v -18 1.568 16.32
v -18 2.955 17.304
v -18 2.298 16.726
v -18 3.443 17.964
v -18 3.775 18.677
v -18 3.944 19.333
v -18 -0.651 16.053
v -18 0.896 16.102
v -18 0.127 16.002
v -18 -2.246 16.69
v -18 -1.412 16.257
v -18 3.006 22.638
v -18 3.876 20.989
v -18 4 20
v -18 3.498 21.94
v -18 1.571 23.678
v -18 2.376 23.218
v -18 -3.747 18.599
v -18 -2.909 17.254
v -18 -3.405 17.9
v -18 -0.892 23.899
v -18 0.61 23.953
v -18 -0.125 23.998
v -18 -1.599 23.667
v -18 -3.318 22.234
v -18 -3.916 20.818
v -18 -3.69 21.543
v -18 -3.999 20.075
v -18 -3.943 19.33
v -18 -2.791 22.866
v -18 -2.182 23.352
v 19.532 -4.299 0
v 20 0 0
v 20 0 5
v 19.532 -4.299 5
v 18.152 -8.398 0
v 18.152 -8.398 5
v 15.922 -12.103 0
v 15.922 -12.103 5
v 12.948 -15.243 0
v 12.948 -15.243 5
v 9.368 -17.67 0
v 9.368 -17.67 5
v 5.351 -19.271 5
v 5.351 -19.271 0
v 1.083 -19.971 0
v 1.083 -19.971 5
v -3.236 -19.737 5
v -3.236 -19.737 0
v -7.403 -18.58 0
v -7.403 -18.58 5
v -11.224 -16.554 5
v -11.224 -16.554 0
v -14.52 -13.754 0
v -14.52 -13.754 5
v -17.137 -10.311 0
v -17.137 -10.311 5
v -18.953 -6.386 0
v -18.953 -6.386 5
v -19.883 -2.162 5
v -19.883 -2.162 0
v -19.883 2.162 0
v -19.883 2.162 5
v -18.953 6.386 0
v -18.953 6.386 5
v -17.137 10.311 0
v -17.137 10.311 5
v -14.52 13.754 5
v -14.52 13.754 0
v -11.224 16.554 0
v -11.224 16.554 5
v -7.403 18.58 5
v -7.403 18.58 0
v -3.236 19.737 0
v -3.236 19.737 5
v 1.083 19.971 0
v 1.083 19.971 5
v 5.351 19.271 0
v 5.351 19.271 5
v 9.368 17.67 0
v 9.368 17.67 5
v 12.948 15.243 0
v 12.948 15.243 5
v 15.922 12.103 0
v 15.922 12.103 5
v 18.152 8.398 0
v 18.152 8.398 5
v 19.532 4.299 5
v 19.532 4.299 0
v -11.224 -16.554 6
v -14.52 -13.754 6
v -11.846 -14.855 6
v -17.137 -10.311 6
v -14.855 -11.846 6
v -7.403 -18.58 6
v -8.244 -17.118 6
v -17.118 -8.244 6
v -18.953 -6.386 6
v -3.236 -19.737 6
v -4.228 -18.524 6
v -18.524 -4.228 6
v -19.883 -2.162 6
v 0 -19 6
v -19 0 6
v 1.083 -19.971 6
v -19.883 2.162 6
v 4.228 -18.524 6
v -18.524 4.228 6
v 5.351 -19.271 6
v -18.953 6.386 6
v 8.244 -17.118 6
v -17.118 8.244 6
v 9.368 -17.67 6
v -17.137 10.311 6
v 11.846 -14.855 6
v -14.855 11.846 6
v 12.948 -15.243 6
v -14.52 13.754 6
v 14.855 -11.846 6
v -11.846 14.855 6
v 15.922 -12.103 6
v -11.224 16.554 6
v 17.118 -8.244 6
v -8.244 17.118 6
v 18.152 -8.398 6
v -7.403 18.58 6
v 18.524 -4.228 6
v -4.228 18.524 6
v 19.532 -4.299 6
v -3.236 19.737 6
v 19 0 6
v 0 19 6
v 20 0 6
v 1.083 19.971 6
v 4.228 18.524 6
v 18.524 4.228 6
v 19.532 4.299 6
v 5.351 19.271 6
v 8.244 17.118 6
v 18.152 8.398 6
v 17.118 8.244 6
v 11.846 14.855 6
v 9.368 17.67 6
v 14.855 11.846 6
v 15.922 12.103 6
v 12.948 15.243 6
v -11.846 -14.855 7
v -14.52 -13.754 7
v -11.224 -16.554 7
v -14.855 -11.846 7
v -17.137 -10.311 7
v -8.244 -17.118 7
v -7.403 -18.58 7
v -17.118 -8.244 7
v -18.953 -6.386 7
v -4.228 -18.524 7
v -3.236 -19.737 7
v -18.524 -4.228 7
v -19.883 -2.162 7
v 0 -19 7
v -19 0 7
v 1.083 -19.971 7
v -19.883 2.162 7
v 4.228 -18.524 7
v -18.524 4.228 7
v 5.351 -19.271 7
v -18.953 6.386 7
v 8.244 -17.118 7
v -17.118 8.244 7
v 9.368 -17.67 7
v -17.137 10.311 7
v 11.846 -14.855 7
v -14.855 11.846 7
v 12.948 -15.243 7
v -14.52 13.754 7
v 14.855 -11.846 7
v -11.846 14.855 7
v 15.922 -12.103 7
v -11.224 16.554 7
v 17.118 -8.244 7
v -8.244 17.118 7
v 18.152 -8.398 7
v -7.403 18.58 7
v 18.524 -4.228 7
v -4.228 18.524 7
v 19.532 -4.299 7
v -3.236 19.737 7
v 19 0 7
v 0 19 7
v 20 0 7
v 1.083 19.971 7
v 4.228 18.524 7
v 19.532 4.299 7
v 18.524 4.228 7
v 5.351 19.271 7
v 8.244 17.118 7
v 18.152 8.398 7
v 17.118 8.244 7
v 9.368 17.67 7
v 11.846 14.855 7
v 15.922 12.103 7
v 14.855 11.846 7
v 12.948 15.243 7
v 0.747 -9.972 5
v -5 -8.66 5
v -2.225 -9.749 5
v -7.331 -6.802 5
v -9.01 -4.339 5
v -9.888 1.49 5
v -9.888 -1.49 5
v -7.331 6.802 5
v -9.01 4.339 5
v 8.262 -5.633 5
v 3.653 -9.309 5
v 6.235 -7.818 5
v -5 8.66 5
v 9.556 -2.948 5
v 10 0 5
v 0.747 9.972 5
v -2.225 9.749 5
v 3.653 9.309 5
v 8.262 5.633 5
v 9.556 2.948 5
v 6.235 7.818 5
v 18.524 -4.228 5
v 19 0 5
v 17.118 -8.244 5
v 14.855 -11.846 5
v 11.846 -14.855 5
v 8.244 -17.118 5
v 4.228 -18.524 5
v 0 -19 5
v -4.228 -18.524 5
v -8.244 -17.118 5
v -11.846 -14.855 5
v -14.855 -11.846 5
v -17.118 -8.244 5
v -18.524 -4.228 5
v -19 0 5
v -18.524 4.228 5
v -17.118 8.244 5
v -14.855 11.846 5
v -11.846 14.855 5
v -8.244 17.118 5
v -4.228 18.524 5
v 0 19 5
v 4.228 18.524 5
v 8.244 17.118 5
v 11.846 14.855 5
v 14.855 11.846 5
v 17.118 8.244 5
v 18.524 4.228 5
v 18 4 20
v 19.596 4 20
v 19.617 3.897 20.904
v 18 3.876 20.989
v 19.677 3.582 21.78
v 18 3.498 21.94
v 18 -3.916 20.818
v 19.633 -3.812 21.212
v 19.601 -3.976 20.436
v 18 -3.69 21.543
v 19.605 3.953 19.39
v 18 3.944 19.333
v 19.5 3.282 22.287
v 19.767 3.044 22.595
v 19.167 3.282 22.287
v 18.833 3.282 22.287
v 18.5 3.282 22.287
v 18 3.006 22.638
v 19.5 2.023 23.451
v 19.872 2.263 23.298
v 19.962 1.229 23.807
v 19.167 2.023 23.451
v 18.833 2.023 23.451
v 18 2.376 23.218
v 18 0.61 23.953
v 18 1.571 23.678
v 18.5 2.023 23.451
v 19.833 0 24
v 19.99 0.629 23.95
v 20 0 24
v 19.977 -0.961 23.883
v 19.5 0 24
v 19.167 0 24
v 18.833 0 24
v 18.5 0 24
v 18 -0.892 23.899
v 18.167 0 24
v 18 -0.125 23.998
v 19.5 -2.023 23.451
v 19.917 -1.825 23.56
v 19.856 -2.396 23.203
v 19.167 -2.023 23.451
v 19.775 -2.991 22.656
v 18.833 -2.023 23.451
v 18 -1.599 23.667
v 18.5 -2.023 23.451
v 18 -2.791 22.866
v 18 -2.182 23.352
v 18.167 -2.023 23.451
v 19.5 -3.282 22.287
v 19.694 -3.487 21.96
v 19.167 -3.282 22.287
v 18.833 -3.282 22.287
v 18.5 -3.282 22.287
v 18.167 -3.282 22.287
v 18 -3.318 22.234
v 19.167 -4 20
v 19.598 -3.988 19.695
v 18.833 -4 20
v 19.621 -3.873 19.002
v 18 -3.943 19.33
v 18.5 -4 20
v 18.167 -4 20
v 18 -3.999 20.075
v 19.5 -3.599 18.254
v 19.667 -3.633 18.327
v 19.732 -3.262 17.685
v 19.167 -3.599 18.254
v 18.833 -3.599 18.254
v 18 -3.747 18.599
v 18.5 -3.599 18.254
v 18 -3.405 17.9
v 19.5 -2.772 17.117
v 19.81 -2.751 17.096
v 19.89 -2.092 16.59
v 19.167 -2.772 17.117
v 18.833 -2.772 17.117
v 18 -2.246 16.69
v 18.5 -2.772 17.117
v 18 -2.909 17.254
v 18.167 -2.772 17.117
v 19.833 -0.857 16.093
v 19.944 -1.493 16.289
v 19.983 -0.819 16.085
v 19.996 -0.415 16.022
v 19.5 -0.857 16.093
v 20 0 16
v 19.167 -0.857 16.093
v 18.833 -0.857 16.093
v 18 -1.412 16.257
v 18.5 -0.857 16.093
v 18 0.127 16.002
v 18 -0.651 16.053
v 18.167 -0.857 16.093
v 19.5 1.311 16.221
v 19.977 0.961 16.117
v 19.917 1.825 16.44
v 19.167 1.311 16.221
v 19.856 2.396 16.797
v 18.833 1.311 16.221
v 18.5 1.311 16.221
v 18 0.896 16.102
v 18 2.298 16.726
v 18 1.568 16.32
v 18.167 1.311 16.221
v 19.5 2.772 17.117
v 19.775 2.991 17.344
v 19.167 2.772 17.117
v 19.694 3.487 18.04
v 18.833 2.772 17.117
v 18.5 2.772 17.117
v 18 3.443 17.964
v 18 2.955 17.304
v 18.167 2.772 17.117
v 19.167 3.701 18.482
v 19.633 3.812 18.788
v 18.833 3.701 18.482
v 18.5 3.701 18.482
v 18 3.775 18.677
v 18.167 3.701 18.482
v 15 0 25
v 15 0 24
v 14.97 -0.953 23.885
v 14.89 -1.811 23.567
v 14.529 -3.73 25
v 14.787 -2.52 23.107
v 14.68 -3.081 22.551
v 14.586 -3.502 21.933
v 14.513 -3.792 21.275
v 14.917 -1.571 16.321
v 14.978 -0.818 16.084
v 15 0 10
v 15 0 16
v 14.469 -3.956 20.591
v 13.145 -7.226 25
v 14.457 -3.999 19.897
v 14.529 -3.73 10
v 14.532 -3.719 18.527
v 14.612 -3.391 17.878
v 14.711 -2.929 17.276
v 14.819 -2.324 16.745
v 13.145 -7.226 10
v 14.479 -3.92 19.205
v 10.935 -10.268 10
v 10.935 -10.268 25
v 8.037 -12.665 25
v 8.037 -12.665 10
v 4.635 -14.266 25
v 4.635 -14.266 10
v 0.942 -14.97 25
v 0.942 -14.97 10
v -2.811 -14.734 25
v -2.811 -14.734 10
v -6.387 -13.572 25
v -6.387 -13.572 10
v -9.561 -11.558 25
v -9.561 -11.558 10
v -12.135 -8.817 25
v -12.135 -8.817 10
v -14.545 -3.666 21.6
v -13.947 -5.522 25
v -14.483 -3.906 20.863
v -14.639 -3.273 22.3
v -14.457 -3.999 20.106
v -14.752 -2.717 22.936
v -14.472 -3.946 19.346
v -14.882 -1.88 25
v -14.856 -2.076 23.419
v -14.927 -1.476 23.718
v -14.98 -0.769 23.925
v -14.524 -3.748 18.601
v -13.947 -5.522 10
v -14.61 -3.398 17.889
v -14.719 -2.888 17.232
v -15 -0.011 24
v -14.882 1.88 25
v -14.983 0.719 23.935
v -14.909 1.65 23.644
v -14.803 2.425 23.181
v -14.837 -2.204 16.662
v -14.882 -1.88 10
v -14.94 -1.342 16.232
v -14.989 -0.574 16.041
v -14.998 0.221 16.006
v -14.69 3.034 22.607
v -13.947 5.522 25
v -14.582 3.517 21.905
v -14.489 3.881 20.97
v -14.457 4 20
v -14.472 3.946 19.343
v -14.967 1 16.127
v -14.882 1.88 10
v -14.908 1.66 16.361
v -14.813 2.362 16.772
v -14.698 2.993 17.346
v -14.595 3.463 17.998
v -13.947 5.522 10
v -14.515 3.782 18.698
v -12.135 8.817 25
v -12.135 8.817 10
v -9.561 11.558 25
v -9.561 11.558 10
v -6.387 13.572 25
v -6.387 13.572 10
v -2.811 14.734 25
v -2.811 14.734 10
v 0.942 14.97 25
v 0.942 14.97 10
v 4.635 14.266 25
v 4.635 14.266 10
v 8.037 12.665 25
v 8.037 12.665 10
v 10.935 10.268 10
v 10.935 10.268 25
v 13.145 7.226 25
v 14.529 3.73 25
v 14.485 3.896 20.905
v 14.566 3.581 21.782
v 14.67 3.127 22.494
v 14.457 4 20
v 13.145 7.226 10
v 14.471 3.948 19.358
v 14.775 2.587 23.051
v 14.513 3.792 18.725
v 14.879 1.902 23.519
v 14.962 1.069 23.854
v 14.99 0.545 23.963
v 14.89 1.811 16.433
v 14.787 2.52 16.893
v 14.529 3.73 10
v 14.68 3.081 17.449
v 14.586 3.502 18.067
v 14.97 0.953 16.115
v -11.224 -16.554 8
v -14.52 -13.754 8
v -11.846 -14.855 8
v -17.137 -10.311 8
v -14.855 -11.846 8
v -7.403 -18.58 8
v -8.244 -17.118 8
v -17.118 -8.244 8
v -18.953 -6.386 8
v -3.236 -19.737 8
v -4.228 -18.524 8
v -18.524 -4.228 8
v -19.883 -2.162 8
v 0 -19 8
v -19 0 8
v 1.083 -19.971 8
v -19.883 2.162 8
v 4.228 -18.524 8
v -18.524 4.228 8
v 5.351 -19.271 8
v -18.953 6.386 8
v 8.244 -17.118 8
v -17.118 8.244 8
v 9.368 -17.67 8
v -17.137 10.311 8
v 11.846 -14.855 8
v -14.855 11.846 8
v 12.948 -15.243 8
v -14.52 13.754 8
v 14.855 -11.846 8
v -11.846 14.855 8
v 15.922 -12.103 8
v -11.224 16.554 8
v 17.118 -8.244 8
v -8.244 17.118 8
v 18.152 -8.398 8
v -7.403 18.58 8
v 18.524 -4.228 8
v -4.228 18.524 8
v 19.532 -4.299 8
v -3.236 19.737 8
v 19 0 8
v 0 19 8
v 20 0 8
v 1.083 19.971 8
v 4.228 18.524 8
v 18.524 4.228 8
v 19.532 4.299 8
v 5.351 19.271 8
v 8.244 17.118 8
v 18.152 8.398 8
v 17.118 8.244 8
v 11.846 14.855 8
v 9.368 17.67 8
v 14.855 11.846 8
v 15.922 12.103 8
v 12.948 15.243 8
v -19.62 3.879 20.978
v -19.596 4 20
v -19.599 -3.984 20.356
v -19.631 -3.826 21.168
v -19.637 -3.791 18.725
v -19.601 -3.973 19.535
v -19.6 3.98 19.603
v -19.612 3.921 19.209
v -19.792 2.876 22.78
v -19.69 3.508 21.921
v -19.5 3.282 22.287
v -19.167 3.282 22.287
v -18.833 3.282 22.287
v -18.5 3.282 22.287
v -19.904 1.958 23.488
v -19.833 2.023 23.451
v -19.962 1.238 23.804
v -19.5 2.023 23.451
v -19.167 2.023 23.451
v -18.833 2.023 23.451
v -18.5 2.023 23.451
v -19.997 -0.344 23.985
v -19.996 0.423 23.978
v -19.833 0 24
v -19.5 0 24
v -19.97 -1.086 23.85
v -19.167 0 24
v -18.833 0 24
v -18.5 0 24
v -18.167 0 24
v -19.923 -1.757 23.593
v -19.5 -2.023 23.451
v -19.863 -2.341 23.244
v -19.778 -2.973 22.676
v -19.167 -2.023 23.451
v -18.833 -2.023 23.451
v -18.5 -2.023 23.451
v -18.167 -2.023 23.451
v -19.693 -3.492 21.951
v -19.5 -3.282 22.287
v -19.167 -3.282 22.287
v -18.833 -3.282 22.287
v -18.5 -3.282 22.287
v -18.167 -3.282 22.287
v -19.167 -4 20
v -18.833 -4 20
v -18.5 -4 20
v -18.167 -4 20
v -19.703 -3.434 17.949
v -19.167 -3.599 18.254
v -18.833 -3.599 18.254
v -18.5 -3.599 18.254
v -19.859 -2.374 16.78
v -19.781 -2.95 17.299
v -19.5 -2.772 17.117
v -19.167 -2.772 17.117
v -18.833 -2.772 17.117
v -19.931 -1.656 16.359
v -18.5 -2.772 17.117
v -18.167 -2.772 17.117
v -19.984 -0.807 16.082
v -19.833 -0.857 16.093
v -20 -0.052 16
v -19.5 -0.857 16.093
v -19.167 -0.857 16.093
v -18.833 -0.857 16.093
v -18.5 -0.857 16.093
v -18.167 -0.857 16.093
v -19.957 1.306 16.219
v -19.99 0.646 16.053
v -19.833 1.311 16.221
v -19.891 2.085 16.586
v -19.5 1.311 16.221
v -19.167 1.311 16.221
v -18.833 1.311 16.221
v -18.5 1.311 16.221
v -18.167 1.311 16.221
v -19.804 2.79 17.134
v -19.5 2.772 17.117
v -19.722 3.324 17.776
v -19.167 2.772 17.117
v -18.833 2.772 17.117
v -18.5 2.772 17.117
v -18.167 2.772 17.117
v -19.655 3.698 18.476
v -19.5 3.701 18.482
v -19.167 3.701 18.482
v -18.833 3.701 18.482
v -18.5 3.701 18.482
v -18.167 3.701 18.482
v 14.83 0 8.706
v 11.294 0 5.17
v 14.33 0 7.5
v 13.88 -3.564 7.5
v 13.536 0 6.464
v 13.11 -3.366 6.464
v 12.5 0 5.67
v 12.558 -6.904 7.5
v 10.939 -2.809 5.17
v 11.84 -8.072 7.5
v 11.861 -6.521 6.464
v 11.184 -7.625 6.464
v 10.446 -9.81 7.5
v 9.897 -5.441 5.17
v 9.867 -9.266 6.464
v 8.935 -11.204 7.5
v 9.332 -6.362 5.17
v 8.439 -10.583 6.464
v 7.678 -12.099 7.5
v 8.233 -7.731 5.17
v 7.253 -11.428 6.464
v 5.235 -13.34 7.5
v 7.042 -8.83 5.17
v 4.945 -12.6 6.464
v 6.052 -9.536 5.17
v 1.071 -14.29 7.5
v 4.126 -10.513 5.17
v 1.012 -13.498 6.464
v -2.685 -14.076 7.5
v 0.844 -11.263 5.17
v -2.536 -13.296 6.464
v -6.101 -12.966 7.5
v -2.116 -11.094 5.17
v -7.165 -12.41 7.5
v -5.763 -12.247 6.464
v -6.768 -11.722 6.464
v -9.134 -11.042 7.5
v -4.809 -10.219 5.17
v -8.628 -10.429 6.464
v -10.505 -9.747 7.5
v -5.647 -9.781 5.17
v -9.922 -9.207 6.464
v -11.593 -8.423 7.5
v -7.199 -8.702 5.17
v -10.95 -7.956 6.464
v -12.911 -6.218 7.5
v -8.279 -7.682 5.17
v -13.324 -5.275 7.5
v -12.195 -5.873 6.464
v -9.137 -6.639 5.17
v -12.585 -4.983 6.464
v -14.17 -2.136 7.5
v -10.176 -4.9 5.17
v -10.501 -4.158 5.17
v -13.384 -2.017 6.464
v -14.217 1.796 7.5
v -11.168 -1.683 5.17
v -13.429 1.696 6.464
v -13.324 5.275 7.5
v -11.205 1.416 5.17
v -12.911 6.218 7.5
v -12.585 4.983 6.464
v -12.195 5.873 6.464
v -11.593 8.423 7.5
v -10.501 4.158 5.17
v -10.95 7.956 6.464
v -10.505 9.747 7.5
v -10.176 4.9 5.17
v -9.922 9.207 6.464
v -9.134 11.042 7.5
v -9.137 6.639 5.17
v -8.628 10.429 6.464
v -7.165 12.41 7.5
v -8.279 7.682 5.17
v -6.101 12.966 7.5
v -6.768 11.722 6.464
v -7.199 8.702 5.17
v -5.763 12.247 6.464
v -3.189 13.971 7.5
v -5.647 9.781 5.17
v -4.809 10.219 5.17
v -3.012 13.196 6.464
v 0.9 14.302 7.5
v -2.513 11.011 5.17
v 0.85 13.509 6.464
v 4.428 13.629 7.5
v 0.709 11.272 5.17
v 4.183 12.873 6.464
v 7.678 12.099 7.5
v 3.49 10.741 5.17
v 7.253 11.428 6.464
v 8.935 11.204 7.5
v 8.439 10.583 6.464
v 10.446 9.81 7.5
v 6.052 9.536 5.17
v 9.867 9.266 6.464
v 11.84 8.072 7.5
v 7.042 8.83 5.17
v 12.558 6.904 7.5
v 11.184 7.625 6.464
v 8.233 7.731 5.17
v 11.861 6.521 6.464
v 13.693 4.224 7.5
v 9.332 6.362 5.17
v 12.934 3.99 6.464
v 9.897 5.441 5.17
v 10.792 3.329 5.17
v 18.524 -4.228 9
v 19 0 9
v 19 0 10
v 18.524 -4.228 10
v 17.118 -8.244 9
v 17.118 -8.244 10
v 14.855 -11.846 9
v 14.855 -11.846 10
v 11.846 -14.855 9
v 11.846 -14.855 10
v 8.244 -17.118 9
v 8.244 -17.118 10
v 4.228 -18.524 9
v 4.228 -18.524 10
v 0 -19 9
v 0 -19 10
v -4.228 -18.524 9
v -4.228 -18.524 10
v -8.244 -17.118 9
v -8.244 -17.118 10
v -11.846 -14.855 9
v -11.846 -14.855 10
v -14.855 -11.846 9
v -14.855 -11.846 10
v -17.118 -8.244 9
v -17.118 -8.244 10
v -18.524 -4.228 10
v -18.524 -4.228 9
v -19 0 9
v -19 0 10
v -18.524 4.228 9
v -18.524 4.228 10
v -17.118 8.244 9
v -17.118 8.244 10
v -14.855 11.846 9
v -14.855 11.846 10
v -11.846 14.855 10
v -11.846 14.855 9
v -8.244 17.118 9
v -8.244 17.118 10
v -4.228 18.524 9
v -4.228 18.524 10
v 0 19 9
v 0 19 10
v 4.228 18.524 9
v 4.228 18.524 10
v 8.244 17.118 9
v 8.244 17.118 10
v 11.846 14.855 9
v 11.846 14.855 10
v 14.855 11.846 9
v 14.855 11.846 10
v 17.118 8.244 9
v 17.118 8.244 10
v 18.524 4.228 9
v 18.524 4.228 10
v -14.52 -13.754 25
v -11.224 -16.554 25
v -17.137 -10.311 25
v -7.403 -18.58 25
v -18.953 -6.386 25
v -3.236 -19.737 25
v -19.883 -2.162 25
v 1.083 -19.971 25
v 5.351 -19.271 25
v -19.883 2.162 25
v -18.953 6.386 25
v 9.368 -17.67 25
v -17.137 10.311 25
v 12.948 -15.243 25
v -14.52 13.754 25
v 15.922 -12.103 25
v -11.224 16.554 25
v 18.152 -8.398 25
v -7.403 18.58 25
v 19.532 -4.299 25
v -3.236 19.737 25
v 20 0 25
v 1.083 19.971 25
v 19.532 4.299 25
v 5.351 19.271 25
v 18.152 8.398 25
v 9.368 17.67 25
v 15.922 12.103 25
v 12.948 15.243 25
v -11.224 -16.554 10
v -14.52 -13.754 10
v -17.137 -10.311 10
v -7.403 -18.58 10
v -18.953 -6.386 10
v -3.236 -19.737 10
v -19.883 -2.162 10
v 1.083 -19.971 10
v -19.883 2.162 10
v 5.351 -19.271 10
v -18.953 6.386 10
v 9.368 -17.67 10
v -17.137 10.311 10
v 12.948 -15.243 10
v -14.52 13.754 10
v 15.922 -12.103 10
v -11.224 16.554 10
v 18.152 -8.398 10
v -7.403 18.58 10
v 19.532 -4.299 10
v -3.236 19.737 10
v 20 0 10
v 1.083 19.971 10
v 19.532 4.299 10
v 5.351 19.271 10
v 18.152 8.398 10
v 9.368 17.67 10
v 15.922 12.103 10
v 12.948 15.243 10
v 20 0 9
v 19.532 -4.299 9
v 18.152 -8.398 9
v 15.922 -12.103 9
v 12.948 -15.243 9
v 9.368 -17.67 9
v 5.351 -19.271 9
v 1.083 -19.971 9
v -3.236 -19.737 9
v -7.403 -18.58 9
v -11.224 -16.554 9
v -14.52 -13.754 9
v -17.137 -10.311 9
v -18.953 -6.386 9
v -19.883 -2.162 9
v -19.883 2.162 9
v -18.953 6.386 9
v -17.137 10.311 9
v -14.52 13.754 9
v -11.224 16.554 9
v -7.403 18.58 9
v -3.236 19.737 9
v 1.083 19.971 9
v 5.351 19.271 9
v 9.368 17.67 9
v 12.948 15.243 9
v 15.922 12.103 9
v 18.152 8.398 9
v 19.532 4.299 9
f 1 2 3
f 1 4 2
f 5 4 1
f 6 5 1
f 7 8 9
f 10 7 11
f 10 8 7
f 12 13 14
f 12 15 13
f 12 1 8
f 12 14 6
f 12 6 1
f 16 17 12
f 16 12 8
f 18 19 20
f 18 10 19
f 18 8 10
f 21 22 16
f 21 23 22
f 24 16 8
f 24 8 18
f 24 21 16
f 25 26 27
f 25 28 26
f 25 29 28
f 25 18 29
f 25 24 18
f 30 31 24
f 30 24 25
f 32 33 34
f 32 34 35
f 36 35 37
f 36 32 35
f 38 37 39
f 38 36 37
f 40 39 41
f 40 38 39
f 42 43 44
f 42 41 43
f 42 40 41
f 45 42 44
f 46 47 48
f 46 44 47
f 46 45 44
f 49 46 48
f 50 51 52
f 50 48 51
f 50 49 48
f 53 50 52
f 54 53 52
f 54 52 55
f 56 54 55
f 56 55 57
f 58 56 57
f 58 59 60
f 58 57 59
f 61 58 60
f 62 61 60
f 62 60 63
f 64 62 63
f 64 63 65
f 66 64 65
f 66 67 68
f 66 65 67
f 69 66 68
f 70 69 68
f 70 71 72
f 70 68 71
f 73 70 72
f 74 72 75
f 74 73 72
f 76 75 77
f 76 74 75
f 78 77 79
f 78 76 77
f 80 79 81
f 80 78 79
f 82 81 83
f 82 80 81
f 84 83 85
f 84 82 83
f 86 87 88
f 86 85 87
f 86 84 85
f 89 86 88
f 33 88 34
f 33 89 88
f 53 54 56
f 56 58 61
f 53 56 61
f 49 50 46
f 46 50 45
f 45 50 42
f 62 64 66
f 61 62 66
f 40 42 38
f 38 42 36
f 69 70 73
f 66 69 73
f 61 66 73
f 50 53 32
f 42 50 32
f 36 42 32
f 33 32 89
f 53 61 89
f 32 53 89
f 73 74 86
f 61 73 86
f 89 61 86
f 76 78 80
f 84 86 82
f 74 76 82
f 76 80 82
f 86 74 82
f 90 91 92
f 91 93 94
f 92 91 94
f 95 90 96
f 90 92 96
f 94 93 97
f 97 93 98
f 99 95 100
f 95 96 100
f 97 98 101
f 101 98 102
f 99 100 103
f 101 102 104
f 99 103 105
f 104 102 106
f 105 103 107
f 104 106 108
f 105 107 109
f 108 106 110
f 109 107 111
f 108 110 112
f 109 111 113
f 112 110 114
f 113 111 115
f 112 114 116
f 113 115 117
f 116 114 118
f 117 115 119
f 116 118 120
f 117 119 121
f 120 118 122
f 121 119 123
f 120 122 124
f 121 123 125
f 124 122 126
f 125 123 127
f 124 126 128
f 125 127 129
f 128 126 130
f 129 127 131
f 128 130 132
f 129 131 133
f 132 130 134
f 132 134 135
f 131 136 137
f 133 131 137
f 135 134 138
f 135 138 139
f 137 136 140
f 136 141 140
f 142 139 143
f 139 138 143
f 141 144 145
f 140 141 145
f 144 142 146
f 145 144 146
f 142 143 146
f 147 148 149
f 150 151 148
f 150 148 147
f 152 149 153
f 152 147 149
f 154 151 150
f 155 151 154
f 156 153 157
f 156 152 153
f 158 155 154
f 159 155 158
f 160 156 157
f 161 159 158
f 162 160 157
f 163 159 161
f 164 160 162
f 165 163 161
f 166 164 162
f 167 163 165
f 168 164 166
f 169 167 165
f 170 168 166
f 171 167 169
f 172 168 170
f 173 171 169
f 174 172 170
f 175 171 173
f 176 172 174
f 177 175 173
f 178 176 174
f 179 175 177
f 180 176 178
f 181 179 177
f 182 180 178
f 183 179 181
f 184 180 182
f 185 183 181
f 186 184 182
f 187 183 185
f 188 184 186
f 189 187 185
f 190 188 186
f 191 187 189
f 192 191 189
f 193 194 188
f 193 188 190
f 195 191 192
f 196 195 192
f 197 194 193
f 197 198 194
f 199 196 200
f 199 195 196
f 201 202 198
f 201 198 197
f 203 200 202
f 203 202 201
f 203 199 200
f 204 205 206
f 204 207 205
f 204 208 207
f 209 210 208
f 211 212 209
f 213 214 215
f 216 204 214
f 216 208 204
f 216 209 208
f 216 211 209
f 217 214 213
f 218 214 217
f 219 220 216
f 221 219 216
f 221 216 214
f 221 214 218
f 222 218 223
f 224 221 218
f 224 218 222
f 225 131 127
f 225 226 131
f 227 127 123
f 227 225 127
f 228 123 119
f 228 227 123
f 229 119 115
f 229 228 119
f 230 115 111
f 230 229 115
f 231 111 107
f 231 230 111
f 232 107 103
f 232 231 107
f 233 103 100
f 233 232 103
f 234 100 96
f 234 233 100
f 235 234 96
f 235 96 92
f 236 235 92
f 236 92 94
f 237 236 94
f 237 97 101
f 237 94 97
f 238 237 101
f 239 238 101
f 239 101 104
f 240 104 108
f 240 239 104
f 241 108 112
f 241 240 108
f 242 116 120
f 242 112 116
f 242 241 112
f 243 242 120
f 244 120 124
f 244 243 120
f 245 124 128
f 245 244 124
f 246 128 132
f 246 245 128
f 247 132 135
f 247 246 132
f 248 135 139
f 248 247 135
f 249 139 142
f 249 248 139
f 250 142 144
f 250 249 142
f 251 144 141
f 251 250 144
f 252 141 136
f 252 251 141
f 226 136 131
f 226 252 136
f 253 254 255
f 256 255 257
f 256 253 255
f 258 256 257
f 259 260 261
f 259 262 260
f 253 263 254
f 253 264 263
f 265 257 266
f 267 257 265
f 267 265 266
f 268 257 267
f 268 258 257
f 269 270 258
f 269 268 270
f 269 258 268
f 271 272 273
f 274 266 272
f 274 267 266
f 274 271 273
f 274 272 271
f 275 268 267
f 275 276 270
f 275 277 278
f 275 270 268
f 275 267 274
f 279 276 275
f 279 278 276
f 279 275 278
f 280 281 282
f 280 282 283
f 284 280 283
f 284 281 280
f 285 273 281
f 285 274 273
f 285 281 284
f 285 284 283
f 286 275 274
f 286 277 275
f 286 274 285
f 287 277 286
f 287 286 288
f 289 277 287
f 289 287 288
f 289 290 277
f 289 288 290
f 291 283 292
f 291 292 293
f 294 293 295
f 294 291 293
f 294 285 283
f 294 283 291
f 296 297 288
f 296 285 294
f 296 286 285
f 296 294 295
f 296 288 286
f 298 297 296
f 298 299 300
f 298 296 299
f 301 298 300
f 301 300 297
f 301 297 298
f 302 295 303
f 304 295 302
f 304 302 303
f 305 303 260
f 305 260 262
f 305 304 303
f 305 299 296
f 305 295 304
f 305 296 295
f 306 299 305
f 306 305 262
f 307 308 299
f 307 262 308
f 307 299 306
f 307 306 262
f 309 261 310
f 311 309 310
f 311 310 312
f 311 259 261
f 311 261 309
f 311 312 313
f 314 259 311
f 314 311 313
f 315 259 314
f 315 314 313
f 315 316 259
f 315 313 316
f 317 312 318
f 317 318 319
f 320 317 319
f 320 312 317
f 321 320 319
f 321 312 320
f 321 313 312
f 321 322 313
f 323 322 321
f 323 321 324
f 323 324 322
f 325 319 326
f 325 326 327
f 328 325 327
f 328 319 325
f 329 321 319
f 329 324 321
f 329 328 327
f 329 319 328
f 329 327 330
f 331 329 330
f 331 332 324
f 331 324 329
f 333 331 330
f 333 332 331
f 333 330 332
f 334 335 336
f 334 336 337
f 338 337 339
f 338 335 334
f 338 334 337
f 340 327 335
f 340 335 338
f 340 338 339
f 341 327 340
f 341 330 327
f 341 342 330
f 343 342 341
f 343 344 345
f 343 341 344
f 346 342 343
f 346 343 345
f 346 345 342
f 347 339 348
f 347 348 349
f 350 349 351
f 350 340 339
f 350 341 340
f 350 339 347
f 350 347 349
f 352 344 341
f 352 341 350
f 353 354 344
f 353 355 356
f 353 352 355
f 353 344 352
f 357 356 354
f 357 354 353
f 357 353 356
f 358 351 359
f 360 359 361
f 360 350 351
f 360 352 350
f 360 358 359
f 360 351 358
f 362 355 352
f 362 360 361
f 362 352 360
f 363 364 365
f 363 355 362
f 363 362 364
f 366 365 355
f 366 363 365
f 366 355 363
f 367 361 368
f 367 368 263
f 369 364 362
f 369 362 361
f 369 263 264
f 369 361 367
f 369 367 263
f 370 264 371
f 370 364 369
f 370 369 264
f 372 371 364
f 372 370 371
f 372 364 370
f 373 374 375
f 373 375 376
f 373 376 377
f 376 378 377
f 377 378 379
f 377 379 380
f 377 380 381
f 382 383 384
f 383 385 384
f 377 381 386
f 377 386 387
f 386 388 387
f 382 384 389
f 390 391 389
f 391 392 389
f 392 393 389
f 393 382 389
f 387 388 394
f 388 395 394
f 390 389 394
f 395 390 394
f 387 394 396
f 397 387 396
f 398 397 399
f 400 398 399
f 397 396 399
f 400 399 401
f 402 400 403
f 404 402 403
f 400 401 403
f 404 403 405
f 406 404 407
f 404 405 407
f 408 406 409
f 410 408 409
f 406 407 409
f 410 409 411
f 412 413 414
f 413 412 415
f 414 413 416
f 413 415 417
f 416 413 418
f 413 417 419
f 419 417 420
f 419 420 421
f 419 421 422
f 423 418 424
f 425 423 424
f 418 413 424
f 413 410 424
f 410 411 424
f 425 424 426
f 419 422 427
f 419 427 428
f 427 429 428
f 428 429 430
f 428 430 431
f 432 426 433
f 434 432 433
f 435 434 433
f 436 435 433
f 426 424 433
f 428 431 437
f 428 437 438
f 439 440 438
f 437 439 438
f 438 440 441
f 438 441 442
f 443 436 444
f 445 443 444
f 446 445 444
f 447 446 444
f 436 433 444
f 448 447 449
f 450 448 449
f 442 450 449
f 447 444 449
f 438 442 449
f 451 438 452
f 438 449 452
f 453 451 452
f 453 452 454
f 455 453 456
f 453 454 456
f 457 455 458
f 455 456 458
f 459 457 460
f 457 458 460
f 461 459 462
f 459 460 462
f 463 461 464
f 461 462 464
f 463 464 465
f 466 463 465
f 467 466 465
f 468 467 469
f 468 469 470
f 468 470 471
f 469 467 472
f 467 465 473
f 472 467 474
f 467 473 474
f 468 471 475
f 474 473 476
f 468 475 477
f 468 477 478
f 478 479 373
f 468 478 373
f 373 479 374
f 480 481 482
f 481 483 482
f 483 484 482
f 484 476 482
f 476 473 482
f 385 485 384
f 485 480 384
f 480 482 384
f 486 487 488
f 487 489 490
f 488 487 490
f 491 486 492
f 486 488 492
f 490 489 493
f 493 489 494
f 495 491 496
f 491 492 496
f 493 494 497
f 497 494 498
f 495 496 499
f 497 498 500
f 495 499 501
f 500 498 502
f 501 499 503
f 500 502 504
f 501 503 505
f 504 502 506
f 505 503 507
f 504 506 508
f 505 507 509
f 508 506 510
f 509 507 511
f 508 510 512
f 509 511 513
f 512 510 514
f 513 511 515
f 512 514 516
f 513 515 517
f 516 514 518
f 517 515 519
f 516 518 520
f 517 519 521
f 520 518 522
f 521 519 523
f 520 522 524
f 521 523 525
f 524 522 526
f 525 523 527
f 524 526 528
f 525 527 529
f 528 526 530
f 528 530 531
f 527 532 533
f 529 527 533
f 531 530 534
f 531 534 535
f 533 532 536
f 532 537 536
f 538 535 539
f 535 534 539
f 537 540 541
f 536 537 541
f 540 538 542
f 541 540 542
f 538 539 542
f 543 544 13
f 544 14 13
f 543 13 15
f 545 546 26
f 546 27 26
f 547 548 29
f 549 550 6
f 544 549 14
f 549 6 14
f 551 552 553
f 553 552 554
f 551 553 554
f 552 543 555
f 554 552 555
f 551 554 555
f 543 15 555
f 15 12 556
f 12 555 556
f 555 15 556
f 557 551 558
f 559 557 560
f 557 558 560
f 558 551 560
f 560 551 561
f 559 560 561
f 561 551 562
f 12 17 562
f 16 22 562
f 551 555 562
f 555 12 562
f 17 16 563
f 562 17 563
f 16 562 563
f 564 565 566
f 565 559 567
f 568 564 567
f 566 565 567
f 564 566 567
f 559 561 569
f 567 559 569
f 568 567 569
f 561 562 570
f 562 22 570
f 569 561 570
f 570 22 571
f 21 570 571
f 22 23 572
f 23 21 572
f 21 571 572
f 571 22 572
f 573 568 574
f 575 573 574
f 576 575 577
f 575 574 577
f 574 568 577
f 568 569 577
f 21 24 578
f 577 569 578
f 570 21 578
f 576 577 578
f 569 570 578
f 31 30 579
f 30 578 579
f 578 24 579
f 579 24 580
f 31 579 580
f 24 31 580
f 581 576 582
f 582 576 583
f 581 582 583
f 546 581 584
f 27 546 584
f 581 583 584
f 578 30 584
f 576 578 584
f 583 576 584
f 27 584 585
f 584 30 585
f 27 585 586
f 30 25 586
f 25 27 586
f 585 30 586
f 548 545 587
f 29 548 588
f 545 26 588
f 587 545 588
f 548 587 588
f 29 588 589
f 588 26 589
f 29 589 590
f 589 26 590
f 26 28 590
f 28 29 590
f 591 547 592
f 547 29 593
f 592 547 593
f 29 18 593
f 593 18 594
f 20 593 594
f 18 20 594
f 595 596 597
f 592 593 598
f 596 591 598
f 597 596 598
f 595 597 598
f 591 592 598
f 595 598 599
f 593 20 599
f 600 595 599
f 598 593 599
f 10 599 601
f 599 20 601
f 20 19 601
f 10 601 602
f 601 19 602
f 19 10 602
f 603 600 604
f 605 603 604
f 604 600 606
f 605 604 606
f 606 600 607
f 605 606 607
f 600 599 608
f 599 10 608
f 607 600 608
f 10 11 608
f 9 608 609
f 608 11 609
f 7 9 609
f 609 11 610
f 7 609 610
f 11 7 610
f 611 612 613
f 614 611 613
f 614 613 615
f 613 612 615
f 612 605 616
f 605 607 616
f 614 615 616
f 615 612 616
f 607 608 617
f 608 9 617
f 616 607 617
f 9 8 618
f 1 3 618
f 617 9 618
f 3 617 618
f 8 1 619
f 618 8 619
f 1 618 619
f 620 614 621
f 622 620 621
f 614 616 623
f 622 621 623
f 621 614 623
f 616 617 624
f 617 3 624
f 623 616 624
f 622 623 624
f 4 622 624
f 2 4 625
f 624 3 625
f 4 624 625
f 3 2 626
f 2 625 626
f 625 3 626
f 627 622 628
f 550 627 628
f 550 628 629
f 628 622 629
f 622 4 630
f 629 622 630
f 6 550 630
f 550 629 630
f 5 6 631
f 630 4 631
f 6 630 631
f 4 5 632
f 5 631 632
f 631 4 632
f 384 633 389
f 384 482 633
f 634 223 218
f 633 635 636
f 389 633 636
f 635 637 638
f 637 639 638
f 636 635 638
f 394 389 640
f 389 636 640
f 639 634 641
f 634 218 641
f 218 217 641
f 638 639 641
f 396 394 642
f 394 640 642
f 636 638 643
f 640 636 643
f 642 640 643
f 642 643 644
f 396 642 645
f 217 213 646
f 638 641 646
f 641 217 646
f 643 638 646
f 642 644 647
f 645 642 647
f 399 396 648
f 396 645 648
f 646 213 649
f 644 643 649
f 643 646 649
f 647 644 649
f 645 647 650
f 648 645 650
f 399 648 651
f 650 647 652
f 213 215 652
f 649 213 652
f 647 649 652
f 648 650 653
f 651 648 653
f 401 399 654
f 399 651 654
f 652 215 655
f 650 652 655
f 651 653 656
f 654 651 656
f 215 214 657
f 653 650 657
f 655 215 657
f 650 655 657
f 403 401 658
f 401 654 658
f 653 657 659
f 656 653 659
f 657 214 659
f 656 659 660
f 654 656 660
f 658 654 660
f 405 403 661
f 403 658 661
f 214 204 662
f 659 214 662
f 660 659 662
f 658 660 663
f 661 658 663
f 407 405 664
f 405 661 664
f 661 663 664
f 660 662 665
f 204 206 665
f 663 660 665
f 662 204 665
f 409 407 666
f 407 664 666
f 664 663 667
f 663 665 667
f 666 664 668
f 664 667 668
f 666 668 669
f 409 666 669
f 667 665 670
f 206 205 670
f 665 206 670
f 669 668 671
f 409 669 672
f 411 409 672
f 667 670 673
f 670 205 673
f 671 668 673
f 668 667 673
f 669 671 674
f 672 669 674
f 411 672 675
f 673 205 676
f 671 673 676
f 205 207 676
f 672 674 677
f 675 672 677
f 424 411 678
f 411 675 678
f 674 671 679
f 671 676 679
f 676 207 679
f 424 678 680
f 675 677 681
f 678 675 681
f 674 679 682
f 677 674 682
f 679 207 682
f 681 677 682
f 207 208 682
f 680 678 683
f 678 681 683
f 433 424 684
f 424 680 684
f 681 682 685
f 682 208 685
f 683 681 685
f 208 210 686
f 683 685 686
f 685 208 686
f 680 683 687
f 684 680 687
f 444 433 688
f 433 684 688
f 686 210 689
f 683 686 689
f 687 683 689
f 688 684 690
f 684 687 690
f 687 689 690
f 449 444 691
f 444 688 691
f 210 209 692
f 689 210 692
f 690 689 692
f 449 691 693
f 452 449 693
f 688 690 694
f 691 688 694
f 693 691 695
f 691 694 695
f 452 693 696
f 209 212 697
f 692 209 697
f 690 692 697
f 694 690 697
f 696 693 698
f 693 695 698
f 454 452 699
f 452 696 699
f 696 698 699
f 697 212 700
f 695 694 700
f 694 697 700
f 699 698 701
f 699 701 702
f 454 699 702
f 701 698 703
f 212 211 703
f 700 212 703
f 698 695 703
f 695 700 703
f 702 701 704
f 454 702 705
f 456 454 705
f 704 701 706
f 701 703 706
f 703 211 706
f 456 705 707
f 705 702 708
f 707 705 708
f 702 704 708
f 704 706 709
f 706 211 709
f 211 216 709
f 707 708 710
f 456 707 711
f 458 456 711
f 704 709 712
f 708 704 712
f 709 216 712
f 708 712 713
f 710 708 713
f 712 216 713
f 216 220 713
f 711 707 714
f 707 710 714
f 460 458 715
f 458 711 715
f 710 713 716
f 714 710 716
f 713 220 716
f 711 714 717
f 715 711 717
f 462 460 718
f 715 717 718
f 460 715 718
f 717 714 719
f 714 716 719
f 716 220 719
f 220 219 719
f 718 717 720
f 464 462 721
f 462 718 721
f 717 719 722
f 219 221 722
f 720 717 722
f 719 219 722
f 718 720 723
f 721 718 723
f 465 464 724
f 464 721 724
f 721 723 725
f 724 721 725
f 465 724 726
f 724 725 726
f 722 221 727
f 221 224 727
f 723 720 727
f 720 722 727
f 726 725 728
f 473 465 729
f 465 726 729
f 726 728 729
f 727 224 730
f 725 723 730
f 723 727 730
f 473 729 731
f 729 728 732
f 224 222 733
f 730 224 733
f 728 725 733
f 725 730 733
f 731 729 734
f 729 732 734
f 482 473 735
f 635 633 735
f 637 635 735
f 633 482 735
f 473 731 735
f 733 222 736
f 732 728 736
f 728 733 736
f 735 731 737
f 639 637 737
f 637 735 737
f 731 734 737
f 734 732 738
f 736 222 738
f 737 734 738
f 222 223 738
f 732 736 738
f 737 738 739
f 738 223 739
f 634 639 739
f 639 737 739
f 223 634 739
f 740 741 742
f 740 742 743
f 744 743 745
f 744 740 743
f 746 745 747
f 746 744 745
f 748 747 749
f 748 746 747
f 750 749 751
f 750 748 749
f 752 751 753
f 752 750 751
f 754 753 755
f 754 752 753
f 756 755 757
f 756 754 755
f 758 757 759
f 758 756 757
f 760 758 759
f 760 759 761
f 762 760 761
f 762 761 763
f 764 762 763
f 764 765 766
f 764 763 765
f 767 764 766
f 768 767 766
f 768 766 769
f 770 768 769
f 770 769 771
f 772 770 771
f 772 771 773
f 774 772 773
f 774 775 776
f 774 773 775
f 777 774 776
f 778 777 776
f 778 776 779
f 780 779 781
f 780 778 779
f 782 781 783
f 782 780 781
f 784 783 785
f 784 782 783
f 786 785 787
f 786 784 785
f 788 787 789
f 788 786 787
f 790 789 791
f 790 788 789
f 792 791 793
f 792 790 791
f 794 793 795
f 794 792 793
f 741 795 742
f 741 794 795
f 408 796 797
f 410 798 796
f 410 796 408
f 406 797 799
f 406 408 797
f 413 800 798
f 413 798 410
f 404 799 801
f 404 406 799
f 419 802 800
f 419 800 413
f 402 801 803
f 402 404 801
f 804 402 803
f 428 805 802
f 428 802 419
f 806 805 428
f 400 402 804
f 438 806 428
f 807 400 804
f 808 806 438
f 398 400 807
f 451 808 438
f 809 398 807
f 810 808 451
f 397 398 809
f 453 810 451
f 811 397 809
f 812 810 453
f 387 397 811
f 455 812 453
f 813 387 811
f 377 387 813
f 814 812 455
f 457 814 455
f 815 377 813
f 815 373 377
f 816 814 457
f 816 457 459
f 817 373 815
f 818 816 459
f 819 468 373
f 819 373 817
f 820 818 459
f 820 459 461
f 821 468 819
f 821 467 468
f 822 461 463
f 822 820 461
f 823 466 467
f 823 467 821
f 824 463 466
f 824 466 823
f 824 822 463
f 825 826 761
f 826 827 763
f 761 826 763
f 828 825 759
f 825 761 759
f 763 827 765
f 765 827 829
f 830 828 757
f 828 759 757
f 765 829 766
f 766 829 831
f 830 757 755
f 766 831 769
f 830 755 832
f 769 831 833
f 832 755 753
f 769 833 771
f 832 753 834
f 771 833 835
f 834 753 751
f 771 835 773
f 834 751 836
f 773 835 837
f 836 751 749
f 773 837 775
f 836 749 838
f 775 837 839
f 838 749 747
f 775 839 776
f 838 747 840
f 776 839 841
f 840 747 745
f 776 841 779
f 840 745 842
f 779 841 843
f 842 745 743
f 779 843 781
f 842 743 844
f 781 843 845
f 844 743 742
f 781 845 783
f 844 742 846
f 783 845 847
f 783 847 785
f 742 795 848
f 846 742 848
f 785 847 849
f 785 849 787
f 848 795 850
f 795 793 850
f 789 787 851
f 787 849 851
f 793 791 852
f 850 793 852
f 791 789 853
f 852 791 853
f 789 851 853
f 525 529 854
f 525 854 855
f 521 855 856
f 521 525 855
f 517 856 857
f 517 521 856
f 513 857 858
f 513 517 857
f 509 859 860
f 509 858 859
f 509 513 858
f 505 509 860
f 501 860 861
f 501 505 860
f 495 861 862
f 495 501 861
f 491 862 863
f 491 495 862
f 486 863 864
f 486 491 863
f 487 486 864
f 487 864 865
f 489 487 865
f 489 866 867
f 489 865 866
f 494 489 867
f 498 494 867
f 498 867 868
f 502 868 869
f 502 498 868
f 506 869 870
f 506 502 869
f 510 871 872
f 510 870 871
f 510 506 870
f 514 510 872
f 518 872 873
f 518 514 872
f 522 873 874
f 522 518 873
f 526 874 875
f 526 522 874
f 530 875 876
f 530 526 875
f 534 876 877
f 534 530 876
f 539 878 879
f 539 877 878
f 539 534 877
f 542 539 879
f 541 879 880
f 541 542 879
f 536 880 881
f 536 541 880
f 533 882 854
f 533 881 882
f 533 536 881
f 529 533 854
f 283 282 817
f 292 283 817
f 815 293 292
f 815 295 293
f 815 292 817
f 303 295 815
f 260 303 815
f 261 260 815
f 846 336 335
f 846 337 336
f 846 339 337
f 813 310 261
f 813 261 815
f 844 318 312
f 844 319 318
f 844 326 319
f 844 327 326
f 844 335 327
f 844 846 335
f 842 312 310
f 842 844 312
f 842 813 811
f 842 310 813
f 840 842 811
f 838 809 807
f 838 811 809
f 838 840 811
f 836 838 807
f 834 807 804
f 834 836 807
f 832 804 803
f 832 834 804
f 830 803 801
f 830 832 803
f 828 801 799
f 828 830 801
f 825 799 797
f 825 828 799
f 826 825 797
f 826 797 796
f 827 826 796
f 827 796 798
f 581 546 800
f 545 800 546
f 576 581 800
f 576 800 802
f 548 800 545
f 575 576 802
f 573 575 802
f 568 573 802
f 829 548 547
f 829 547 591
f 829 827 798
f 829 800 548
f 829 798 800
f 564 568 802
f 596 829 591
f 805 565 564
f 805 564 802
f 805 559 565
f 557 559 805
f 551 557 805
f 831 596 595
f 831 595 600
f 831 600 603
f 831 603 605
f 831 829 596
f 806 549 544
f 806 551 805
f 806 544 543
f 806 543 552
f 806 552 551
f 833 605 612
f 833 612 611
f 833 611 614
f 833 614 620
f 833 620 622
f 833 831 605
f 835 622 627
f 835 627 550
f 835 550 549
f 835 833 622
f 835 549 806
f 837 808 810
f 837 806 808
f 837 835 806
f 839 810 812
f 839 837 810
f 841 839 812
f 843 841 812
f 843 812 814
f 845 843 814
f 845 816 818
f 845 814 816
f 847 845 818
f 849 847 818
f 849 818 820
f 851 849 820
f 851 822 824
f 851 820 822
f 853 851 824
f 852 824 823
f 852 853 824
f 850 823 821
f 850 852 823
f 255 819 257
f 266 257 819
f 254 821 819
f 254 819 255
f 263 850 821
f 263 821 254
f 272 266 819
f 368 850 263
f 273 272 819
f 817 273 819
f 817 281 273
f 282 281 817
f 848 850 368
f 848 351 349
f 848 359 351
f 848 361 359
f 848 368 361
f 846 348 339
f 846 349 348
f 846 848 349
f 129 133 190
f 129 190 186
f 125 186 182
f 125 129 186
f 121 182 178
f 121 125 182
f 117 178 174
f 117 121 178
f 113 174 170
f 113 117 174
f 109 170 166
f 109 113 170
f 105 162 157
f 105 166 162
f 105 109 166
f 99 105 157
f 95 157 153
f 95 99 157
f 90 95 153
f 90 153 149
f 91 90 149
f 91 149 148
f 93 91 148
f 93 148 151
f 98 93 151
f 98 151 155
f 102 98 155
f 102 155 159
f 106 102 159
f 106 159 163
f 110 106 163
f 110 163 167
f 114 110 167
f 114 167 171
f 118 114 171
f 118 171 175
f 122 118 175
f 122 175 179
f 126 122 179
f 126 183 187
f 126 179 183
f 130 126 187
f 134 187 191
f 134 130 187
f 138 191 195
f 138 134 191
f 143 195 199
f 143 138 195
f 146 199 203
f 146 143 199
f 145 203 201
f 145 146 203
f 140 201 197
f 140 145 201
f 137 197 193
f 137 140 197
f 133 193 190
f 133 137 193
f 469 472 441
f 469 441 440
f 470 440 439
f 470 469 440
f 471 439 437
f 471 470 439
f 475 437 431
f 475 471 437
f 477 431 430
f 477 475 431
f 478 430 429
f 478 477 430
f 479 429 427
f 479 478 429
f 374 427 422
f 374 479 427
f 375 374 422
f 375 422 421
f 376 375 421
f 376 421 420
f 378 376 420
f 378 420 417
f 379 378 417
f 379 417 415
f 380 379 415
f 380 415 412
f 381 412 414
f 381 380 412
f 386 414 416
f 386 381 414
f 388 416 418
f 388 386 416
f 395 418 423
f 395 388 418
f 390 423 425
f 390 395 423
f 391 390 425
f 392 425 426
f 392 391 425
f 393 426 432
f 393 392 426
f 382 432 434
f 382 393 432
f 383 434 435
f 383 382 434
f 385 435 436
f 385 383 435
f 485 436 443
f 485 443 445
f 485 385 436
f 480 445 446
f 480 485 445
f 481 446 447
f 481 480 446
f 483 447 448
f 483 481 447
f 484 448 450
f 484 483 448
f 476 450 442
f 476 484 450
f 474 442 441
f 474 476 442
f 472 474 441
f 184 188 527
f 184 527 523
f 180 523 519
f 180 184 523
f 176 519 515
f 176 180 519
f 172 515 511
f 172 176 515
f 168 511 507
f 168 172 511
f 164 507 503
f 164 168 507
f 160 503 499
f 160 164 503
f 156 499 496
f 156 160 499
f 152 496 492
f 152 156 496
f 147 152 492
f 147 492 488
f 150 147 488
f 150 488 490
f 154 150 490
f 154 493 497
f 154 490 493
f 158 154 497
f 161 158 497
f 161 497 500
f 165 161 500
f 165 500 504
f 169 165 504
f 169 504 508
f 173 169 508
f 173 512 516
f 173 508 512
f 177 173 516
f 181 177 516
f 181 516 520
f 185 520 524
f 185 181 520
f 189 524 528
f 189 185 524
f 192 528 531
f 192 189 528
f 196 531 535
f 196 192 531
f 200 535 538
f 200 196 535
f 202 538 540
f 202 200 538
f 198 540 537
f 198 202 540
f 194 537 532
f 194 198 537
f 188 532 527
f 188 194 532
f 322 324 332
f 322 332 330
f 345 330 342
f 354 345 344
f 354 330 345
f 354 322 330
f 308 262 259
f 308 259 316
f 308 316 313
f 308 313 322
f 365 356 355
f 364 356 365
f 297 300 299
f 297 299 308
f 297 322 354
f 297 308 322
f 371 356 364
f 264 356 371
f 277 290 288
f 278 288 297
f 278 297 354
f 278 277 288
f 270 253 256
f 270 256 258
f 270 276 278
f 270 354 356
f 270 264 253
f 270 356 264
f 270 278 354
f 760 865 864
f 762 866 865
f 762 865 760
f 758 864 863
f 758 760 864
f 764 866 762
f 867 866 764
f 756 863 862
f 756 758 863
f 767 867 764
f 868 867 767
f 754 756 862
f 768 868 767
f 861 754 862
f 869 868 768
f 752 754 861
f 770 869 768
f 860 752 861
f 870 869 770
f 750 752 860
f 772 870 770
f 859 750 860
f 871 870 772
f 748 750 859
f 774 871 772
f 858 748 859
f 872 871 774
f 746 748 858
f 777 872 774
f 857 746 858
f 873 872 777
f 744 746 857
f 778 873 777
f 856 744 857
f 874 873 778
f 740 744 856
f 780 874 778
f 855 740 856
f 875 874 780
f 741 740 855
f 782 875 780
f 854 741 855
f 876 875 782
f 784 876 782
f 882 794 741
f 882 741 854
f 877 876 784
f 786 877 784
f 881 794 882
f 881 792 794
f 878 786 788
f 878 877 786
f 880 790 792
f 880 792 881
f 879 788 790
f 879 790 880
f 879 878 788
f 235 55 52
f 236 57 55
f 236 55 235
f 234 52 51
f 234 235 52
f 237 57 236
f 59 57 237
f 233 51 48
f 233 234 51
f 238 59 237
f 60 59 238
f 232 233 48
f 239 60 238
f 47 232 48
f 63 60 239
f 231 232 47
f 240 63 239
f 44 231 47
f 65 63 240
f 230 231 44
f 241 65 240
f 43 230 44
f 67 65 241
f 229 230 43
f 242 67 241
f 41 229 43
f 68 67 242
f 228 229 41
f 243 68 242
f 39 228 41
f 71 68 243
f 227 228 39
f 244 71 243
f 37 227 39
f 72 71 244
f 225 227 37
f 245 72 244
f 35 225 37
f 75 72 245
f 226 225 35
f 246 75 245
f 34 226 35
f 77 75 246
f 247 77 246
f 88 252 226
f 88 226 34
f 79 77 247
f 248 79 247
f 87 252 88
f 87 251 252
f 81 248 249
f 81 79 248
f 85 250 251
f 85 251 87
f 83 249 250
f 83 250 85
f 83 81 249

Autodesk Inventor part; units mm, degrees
ref_plane "XZ Plane" through (0, 0, 0) normal (0, 1, 0) x (-1, 0, 0)
sketch "Sketch1" plane through (0, 0, 0) normal (0, 0, 1) x (1, 0, 0)
  circle A0 centre (0, 0) radius 20
  dimension "d0" = 40
extrude "Extrusion1" add sketch "Sketch1" along normal blind 25
shell "Shell1" thickness 5 removed faces 1 at (-2.364, 6.2334, 25)
fillet "Fillet1" radius 5 1 edges at (-15, 0, 5)
sketch "Sketch2" plane through (0, 0, 0) normal (1, 0, 0) x (0, 1, 0)
  line L0 (-28, 0) -> (28, 0) projected
  line L1 (0, -5) -> (0, 30) projected
  circle A0 centre (0, 20) radius 4
  line L2 (20, 25) -> (-20, 25) projected
  point P0 (0, 0)
  dimension "d5" = 8
  dimension "d6" = 5
extrude "Extrusion2" add sketch "Sketch2" along normal through all both and the other way through all
ref_plane "Work Plane1" through (18, 0, 0) normal (1, 0, 0) x (0, 1, 0)
sketch "Sketch3" plane through (18, 0, 0) normal (1, 0, 0) x (0, 1, 0)
  spline S0 degree 5 poles (4, 20) (4, 20.475) (3.9296, 20.9492) (3.7887, 21.4163) (3.5746, 21.8668) (3.0962, 22.5531) (2.8791, 22.8072) (2.6286, 23.0458) (2.3433, 23.263) (1.6847, 23.649) (1.3023, 23.8174) (0.8849, 23.938) (0.4453, 24) (-0.4453, 24) (-0.8849, 23.938) (-1.3023, 23.8174) (-1.6847, 23.649) (-2.3433, 23.263) (-2.6286, 23.0458) (-2.8791, 22.8072) (-3.0962, 22.5531) (-3.5746, 21.8668) (-3.7887, 21.4163) (-3.9296, 20.9492) (-4, 20.475) (-4, 19.6437) (-3.9603, 19.2875) (-3.881, 18.9346) (-3.7611, 18.5887) (-3.4806, 18.0102) (-3.3396, 17.7723) (-3.1752, 17.5422) (-2.9865, 17.3225) (-2.4836, 16.839) (-2.1457, 16.5837) (-1.7587, 16.3645) (-1.3265, 16.1959) (-0.4314, 15.9995) (0.0204, 15.9613) (0.4754, 15.9901) (0.9122, 16.0827) (1.662, 16.3427) (1.9854, 16.5006) (2.2787, 16.6866) (2.5408, 16.8939) (3.2793, 17.604) (3.6446, 18.1696) (3.8809, 18.7676) (4, 19.3828) (4, 20) knots 0 0 0 0 0 0 0.108769 0.108769 0.108769 0.108769 0.177598 0.177598 0.177598 0.177598 0.250135 0.250135 0.250135 0.250135 0.322672 0.322672 0.322672 0.322672 0.3915 0.3915 0.3915 0.3915 0.50027 0.50027 0.50027 0.50027 0.581861 0.581861 0.581861 0.581861 0.641459 0.641459 0.641459 0.641459 0.721814 0.721814 0.721814 0.721814 0.794745 0.794745 0.794745 0.794745 0.859101 0.859101 0.859101 0.859101 1 1 1 1 1 1 projected
  point P0 (0, 0)
  dimension "d10" = 0
extrude "Extrusion3" cut sketch "Sketch3" along normal through all
mirror "Mirror1" about plane through (0, 0, 0) normal (1, 0, 0) of "Extrusion3"
ref_plane "Work Plane2" through (0, 0, 5) normal (0, 0, 1) x (1, 0, 0)
sketch "Sketch4" plane through (0, 0, 5) normal (0, 0, 1) x (1, 0, 0)
  circle A0 centre (0, 0) radius 15 projected
  circle A1 centre (0, 0) radius 20 projected
  circle A2 centre (0, 0) radius 19
  dimension "d14" = 1
extrude "Extrusion4" cut sketch "Sketch4" along normal blind 1 contours A1
pattern_linear "Rectangular Pattern1" count 3 spacing 2 along (0, 0, 1) of "Extrusion4"
properties part number "Piston" material "Steel, Carbon"
